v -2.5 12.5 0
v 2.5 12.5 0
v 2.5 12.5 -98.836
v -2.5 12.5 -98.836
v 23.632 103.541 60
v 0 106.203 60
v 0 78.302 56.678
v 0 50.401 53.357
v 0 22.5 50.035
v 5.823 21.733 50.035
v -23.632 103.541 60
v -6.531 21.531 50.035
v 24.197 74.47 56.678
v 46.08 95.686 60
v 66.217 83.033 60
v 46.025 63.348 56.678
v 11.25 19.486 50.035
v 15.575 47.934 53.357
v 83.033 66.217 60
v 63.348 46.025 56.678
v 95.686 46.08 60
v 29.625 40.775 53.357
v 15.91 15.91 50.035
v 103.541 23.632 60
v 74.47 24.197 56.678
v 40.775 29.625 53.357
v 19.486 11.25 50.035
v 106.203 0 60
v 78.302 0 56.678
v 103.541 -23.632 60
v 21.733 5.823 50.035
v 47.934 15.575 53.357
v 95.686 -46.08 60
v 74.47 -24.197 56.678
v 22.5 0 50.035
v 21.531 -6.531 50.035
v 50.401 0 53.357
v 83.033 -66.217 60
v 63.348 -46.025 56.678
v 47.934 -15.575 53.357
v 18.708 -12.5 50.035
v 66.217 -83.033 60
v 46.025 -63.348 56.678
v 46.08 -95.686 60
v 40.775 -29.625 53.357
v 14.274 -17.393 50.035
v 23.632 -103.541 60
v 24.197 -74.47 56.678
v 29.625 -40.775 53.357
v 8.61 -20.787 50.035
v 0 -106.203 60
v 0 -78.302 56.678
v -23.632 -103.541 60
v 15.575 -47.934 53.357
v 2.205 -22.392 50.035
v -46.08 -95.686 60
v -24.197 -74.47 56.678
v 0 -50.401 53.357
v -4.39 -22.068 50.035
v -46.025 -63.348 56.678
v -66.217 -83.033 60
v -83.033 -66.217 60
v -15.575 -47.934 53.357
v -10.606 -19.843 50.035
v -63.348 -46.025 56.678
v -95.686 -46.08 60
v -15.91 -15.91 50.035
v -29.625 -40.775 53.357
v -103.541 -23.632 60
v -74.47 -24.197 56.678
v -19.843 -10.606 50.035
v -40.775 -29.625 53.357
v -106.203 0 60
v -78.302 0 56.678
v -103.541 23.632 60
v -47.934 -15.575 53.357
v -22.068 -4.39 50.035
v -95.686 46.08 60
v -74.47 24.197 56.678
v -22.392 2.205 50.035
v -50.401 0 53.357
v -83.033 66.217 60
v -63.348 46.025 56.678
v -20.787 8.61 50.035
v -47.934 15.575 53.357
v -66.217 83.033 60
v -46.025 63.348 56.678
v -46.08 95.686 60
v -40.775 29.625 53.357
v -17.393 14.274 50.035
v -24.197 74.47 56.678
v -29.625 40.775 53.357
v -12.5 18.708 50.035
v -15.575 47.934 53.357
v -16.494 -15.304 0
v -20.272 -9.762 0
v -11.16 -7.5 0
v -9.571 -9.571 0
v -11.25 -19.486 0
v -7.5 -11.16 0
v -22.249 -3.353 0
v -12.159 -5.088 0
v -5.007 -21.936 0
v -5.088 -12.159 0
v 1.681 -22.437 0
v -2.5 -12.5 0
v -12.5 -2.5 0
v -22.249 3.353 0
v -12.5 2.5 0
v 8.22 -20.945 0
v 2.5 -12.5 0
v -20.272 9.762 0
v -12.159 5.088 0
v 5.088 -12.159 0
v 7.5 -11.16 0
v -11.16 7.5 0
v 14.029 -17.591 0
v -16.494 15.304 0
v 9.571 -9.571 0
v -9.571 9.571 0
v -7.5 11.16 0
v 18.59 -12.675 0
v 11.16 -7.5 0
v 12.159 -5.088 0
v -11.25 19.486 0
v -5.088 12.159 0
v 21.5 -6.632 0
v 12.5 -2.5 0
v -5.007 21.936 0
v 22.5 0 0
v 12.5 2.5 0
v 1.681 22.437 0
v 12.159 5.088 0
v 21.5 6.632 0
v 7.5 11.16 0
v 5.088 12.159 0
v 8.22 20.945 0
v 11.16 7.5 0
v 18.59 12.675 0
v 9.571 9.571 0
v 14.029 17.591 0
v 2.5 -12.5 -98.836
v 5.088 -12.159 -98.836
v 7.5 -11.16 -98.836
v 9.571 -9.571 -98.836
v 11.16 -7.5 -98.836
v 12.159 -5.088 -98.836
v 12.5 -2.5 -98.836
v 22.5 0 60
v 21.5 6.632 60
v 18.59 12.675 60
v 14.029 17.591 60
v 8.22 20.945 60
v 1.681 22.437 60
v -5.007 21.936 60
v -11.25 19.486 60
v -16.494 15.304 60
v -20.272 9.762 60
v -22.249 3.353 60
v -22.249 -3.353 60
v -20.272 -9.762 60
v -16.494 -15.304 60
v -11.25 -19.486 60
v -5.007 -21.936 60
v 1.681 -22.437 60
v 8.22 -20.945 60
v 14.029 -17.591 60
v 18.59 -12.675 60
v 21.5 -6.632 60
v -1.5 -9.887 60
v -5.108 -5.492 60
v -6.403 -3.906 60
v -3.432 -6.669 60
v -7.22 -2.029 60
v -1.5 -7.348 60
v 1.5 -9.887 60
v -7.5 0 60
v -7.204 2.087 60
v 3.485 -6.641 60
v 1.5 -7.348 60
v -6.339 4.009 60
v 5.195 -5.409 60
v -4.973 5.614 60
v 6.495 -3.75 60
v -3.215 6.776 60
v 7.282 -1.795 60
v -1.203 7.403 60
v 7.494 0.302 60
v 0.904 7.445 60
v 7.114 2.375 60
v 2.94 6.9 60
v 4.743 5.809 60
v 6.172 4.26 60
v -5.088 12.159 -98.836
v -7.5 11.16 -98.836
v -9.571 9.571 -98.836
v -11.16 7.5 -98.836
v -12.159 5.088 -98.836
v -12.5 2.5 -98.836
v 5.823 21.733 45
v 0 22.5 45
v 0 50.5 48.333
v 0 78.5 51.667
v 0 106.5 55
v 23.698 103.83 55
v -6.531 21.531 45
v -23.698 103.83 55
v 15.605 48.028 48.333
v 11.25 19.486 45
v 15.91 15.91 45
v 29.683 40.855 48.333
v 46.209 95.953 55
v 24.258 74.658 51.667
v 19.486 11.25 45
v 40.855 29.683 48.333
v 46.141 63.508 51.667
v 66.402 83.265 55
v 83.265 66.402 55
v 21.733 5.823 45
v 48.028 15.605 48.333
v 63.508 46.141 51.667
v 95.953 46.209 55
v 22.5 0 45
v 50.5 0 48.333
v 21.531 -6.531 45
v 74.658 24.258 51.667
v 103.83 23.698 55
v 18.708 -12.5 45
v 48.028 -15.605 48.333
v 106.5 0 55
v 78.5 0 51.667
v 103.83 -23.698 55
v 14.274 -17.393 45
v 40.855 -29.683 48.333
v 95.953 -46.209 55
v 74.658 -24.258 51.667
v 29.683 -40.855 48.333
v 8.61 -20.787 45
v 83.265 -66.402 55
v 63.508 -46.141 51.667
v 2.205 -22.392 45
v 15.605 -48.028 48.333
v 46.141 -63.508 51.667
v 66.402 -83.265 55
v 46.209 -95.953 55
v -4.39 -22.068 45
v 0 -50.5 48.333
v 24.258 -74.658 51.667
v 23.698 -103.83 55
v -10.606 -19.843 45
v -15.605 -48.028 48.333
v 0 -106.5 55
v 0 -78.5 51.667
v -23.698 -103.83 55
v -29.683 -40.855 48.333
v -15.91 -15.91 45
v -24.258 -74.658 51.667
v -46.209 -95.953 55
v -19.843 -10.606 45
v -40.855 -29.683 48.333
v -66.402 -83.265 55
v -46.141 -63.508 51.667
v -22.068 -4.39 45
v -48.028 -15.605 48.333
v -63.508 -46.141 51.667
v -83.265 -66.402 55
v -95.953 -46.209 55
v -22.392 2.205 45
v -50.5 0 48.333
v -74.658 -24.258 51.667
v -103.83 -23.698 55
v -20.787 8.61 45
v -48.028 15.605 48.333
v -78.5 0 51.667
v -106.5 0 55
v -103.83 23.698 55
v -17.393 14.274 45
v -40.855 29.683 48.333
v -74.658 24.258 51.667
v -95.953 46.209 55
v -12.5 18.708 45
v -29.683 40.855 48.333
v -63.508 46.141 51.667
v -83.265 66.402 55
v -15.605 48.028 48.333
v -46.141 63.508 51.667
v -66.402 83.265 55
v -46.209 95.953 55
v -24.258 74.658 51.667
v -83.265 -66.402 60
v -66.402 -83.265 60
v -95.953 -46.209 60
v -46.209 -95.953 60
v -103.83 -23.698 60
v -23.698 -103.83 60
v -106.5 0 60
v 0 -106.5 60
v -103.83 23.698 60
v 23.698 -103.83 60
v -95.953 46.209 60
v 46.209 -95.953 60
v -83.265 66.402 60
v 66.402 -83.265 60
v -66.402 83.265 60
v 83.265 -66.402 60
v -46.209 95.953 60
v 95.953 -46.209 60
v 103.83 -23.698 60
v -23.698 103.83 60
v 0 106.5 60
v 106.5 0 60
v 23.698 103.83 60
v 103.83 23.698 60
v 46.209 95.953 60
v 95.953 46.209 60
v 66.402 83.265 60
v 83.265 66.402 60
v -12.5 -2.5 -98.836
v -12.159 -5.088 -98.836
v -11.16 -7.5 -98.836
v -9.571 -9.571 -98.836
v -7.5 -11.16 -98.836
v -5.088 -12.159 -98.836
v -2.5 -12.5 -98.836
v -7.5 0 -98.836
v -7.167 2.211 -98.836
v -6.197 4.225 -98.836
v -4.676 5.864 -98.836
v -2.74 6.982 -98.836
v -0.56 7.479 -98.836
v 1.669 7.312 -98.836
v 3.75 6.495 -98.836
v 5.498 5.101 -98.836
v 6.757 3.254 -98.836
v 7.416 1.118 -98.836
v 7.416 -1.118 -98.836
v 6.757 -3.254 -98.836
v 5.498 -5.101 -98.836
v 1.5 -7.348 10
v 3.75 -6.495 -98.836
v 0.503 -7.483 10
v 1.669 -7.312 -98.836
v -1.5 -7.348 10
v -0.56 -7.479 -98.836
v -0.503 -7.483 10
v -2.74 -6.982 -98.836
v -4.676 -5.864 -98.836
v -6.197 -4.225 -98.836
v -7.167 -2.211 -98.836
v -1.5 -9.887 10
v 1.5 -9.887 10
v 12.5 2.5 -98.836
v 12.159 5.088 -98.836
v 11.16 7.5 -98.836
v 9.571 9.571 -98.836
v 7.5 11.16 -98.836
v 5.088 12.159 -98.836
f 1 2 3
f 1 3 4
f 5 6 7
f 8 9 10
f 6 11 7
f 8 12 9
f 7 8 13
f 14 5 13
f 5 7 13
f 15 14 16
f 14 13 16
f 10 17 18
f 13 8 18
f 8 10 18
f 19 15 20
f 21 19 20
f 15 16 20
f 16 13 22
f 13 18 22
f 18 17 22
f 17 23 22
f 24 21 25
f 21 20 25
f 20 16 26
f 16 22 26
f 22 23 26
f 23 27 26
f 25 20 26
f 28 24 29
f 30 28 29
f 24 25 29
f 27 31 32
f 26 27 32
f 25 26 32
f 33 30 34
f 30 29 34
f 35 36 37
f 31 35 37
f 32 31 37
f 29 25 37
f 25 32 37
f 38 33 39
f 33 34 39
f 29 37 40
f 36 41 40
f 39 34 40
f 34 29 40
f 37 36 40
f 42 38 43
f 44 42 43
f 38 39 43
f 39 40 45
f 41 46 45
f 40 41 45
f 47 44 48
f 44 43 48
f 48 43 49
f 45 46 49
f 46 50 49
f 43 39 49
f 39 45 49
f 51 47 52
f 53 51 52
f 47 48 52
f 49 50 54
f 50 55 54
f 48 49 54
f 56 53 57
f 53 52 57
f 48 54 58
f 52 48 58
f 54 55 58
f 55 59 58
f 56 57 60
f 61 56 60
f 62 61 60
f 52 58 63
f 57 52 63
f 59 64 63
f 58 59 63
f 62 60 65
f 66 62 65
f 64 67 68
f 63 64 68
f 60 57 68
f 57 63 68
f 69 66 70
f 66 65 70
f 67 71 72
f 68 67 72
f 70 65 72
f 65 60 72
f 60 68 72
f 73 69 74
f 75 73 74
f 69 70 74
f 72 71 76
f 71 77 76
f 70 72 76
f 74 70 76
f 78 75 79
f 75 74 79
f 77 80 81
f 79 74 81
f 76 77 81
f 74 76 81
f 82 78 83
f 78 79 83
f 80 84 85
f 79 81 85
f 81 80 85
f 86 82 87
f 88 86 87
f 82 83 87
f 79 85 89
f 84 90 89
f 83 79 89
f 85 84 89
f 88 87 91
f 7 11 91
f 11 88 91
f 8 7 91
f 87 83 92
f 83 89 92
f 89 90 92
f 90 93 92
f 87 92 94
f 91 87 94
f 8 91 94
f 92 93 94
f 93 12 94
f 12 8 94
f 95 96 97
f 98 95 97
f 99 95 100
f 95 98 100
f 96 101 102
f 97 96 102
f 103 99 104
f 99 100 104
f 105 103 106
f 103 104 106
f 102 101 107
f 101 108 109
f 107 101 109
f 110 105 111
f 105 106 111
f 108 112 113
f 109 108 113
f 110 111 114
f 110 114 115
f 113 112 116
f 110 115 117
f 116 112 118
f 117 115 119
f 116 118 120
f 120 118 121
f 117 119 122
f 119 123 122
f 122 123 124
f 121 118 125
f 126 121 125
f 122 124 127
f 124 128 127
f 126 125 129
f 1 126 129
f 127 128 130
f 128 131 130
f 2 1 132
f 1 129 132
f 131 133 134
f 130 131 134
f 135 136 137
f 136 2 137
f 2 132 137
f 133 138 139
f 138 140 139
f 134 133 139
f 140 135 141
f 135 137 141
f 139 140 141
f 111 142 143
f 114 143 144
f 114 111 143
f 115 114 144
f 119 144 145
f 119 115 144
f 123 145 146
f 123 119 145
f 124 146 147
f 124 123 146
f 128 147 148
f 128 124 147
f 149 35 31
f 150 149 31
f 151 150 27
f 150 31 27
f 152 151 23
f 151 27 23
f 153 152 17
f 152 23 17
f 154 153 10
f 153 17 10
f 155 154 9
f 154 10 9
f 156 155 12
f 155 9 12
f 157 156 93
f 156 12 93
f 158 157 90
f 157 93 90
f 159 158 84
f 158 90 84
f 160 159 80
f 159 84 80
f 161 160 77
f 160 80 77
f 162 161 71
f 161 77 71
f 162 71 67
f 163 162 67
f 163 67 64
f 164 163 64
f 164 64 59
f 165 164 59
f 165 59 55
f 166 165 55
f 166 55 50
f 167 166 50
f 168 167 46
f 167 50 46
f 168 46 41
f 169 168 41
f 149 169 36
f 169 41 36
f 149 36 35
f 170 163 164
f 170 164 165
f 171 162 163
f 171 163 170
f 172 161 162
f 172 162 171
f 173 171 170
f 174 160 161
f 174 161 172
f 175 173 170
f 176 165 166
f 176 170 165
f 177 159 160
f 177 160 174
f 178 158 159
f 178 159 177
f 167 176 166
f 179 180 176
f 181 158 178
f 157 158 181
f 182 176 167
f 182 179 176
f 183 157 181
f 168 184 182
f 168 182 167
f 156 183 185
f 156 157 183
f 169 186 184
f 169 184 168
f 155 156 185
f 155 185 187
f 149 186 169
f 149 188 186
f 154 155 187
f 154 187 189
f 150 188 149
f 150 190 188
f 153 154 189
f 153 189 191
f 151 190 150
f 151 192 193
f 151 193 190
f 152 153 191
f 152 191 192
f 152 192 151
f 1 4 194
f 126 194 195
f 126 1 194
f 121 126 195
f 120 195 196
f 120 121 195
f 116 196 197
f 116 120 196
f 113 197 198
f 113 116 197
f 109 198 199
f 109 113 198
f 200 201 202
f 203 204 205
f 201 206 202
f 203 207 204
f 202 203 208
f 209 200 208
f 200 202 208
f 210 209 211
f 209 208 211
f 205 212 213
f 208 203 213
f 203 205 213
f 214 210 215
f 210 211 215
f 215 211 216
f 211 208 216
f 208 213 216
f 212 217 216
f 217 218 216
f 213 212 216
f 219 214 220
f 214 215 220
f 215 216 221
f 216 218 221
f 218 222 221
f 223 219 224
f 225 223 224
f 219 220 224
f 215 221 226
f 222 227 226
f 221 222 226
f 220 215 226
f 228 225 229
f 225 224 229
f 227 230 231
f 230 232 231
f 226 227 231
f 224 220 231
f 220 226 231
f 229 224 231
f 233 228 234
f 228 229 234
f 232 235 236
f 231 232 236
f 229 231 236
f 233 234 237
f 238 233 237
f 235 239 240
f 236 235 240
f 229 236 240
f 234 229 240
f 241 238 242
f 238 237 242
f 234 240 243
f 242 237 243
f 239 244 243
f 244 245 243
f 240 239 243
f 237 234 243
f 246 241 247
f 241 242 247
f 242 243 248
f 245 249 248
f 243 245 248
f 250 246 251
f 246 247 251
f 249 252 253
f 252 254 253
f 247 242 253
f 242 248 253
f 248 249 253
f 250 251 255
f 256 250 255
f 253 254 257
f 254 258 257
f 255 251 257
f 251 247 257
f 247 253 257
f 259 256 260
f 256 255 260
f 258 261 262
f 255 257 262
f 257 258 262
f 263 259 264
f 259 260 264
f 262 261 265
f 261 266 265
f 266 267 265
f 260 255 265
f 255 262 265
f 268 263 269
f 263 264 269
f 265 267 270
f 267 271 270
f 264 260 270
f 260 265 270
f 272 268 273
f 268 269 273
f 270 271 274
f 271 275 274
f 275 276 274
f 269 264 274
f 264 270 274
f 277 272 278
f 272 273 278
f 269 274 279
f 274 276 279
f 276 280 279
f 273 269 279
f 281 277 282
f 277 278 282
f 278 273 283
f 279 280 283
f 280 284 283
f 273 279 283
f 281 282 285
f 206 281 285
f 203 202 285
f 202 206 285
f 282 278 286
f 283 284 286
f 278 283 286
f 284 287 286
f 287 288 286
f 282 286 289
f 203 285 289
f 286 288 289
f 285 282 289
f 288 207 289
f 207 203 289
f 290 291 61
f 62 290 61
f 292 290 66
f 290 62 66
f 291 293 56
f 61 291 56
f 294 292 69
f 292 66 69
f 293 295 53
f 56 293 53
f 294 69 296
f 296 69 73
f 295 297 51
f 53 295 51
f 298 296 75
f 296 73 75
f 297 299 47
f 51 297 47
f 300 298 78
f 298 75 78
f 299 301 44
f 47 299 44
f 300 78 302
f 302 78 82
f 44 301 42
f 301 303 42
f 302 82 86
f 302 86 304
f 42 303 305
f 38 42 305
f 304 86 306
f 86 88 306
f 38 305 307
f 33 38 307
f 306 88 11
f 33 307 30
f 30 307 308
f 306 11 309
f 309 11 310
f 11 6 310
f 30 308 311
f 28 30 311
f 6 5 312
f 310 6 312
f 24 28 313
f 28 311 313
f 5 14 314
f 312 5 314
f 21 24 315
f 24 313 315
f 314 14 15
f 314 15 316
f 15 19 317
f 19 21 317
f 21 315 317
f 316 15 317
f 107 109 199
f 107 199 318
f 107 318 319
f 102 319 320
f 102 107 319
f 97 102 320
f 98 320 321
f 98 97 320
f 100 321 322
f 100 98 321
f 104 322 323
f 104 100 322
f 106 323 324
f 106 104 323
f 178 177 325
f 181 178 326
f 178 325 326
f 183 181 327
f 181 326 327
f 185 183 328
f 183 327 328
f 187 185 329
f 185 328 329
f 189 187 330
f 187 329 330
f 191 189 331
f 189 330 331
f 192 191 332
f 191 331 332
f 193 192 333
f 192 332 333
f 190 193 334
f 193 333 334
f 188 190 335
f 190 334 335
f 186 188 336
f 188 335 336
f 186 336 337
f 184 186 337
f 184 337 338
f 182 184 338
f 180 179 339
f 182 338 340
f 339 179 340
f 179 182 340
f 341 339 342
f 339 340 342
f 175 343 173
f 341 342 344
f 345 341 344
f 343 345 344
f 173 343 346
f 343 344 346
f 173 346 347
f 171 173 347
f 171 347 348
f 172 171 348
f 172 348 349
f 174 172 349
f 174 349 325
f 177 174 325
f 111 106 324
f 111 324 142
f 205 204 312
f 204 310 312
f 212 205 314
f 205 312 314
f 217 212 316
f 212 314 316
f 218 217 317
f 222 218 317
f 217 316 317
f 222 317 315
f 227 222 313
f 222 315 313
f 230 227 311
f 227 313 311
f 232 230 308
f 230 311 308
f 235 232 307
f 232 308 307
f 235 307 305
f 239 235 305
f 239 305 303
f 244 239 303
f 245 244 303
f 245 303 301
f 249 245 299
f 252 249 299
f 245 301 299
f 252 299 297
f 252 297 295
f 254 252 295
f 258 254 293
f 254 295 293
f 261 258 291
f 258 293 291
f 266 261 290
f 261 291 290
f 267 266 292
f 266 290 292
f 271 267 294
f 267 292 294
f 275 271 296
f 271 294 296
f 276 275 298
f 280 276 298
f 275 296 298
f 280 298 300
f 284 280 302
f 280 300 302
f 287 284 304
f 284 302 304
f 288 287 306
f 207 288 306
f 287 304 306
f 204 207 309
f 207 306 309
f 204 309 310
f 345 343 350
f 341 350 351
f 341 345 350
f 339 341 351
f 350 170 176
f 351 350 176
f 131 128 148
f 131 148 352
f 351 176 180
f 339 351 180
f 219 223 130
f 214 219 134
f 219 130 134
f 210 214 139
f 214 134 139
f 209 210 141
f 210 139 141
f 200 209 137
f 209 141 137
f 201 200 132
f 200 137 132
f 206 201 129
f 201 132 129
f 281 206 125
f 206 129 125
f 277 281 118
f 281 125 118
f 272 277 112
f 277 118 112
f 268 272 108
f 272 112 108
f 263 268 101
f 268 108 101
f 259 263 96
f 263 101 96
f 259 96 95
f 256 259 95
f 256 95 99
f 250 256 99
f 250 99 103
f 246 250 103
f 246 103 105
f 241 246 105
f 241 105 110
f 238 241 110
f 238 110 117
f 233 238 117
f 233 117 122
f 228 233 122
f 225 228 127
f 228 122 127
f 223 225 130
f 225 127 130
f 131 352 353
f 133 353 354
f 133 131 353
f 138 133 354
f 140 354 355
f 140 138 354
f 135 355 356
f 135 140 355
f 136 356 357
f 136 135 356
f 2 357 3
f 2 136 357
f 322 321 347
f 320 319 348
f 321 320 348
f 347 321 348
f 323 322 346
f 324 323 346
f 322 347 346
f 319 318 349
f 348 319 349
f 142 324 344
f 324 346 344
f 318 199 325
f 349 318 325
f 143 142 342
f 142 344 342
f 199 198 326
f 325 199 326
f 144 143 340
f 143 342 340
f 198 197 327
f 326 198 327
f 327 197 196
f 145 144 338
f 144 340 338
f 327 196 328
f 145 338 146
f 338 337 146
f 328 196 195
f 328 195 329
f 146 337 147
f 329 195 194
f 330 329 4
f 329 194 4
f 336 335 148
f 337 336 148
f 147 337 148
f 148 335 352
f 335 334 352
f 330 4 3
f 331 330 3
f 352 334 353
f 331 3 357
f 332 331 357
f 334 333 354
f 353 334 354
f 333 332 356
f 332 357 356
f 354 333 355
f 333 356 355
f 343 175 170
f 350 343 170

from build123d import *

# Parameters (mm, degrees)
SKETCH1_R           = 22.5
BOSS_EXTRUDE1_DEPTH = 60
BOSS_EXTRUDE2_DEPTH = 98.836337037
SKETCH6_R           = 7.5
CUT_EXTRUDE1_DEPTH  = 159.836337037
CUT_EXTRUDE2_DEPTH  = 50


with BuildPart() as part:
    # Sketch1 → Boss-Extrude1 (new body)
    with BuildSketch(Plane.XY):
        Circle(SKETCH1_R)
    extrude(amount=BOSS_EXTRUDE1_DEPTH)

    # Sketch4 → Boss-Extrude2 (add)
    with BuildSketch(Plane(origin=(0, 0, 0), x_dir=(-1, 0, 0), z_dir=(0, 0, -1))):
        with BuildLine():
            Line((-2.5, 12.5), (2.5, 12.5))
            ThreePointArc((2.5, 12.5), (9.571067812, 9.571067812), (12.5, 2.5))
            Line((12.5, 2.5), (12.5, -2.5))
            ThreePointArc((12.5, -2.5), (9.571067812, -9.571067812), (2.5, -12.5))
            Line((2.5, -12.5), (-2.5, -12.5))
            ThreePointArc((-2.5, -12.5), (-9.571067812, -9.571067812), (-12.5, -2.5))
            Line((-12.5, -2.5), (-12.5, 2.5))
            ThreePointArc((-12.5, 2.5), (-9.571067812, 9.571067812), (-2.5, 12.5))
        make_face()
    extrude(amount=BOSS_EXTRUDE2_DEPTH)

    # Sketch5 → Revolve1 (revolve)
    with BuildSketch(Plane(origin=(0, 0, 0), x_dir=(0, 0, -1), z_dir=(1, 0, 0))):
        Polygon((-60, 106.5), (-60, 106.203428035), (-50.035306186, 22.5), (-45, 22.5), (-55, 106.5), align=None)
    revolve(axis=Axis((0, 0, 60), (0, 0, -1)))

    # Sketch6 → Cut-Extrude1 (cut, through all)
    with BuildSketch(Plane(origin=(0, 0, -98.836337037), x_dir=(-1, 0, 0), z_dir=(0, 0, -1))):
        Circle(SKETCH6_R)
    extrude(amount=-CUT_EXTRUDE1_DEPTH, mode=Mode.SUBTRACT)

    # Sketch7 → Cut-Extrude2 (cut)
    with BuildSketch(Plane.XY.offset(60)):
        with BuildLine():
            ThreePointArc((1.5, -7.348469228), (0, -7.5), (-1.5, -7.348469228))
            Line((-1.5, -7.348469228), (-1.5, -9.886859967))
            Line((-1.5, -9.886859967), (1.5, -9.886859967))
            Line((1.5, -9.886859967), (1.5, -7.348469228))
        make_face()
    extrude(amount=-CUT_EXTRUDE2_DEPTH, mode=Mode.SUBTRACT)


solid = part.part
